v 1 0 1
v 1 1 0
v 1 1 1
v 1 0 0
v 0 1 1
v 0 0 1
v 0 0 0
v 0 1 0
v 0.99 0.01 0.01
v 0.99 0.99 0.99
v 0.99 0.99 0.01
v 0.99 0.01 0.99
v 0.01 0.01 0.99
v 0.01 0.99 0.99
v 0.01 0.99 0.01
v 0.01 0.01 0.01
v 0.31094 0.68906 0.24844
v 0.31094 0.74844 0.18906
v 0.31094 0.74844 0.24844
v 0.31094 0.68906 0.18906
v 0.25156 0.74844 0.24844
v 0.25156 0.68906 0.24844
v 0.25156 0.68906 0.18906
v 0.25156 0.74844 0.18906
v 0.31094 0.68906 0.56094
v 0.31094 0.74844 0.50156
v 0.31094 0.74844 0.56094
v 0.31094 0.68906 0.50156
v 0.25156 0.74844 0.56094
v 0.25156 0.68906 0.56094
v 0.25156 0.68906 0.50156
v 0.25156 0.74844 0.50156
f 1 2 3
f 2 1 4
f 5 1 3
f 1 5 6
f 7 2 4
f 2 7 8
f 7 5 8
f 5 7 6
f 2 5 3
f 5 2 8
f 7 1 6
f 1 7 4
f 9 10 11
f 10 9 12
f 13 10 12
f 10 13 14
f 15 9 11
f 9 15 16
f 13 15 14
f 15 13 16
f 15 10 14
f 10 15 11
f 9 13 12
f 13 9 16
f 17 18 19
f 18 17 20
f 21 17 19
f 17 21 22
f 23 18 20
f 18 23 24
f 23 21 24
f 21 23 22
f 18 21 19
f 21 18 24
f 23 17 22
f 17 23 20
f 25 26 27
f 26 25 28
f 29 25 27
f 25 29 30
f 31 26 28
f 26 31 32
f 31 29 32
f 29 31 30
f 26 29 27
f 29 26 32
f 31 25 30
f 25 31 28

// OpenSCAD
translate([0.28125, 0.71875, 0.21875]) color([0.2619290021782883, 0.20369548429490625, 0.5420815487250377]) cube([0.059375, 0.059375, 0.059375], center=true);
translate([0.28125, 0.71875, 0.53125]) color([0.9221305525684157, 0.837748898711002, 0.8622867035840079]) cube([0.059375, 0.059375, 0.059375], center=true);
color([0.3,0.3,0.3,0.3]) difference() { cube([1,1,1]); translate([0.01,0.01,0.01]) cube([0.98,0.98,0.98]); }
